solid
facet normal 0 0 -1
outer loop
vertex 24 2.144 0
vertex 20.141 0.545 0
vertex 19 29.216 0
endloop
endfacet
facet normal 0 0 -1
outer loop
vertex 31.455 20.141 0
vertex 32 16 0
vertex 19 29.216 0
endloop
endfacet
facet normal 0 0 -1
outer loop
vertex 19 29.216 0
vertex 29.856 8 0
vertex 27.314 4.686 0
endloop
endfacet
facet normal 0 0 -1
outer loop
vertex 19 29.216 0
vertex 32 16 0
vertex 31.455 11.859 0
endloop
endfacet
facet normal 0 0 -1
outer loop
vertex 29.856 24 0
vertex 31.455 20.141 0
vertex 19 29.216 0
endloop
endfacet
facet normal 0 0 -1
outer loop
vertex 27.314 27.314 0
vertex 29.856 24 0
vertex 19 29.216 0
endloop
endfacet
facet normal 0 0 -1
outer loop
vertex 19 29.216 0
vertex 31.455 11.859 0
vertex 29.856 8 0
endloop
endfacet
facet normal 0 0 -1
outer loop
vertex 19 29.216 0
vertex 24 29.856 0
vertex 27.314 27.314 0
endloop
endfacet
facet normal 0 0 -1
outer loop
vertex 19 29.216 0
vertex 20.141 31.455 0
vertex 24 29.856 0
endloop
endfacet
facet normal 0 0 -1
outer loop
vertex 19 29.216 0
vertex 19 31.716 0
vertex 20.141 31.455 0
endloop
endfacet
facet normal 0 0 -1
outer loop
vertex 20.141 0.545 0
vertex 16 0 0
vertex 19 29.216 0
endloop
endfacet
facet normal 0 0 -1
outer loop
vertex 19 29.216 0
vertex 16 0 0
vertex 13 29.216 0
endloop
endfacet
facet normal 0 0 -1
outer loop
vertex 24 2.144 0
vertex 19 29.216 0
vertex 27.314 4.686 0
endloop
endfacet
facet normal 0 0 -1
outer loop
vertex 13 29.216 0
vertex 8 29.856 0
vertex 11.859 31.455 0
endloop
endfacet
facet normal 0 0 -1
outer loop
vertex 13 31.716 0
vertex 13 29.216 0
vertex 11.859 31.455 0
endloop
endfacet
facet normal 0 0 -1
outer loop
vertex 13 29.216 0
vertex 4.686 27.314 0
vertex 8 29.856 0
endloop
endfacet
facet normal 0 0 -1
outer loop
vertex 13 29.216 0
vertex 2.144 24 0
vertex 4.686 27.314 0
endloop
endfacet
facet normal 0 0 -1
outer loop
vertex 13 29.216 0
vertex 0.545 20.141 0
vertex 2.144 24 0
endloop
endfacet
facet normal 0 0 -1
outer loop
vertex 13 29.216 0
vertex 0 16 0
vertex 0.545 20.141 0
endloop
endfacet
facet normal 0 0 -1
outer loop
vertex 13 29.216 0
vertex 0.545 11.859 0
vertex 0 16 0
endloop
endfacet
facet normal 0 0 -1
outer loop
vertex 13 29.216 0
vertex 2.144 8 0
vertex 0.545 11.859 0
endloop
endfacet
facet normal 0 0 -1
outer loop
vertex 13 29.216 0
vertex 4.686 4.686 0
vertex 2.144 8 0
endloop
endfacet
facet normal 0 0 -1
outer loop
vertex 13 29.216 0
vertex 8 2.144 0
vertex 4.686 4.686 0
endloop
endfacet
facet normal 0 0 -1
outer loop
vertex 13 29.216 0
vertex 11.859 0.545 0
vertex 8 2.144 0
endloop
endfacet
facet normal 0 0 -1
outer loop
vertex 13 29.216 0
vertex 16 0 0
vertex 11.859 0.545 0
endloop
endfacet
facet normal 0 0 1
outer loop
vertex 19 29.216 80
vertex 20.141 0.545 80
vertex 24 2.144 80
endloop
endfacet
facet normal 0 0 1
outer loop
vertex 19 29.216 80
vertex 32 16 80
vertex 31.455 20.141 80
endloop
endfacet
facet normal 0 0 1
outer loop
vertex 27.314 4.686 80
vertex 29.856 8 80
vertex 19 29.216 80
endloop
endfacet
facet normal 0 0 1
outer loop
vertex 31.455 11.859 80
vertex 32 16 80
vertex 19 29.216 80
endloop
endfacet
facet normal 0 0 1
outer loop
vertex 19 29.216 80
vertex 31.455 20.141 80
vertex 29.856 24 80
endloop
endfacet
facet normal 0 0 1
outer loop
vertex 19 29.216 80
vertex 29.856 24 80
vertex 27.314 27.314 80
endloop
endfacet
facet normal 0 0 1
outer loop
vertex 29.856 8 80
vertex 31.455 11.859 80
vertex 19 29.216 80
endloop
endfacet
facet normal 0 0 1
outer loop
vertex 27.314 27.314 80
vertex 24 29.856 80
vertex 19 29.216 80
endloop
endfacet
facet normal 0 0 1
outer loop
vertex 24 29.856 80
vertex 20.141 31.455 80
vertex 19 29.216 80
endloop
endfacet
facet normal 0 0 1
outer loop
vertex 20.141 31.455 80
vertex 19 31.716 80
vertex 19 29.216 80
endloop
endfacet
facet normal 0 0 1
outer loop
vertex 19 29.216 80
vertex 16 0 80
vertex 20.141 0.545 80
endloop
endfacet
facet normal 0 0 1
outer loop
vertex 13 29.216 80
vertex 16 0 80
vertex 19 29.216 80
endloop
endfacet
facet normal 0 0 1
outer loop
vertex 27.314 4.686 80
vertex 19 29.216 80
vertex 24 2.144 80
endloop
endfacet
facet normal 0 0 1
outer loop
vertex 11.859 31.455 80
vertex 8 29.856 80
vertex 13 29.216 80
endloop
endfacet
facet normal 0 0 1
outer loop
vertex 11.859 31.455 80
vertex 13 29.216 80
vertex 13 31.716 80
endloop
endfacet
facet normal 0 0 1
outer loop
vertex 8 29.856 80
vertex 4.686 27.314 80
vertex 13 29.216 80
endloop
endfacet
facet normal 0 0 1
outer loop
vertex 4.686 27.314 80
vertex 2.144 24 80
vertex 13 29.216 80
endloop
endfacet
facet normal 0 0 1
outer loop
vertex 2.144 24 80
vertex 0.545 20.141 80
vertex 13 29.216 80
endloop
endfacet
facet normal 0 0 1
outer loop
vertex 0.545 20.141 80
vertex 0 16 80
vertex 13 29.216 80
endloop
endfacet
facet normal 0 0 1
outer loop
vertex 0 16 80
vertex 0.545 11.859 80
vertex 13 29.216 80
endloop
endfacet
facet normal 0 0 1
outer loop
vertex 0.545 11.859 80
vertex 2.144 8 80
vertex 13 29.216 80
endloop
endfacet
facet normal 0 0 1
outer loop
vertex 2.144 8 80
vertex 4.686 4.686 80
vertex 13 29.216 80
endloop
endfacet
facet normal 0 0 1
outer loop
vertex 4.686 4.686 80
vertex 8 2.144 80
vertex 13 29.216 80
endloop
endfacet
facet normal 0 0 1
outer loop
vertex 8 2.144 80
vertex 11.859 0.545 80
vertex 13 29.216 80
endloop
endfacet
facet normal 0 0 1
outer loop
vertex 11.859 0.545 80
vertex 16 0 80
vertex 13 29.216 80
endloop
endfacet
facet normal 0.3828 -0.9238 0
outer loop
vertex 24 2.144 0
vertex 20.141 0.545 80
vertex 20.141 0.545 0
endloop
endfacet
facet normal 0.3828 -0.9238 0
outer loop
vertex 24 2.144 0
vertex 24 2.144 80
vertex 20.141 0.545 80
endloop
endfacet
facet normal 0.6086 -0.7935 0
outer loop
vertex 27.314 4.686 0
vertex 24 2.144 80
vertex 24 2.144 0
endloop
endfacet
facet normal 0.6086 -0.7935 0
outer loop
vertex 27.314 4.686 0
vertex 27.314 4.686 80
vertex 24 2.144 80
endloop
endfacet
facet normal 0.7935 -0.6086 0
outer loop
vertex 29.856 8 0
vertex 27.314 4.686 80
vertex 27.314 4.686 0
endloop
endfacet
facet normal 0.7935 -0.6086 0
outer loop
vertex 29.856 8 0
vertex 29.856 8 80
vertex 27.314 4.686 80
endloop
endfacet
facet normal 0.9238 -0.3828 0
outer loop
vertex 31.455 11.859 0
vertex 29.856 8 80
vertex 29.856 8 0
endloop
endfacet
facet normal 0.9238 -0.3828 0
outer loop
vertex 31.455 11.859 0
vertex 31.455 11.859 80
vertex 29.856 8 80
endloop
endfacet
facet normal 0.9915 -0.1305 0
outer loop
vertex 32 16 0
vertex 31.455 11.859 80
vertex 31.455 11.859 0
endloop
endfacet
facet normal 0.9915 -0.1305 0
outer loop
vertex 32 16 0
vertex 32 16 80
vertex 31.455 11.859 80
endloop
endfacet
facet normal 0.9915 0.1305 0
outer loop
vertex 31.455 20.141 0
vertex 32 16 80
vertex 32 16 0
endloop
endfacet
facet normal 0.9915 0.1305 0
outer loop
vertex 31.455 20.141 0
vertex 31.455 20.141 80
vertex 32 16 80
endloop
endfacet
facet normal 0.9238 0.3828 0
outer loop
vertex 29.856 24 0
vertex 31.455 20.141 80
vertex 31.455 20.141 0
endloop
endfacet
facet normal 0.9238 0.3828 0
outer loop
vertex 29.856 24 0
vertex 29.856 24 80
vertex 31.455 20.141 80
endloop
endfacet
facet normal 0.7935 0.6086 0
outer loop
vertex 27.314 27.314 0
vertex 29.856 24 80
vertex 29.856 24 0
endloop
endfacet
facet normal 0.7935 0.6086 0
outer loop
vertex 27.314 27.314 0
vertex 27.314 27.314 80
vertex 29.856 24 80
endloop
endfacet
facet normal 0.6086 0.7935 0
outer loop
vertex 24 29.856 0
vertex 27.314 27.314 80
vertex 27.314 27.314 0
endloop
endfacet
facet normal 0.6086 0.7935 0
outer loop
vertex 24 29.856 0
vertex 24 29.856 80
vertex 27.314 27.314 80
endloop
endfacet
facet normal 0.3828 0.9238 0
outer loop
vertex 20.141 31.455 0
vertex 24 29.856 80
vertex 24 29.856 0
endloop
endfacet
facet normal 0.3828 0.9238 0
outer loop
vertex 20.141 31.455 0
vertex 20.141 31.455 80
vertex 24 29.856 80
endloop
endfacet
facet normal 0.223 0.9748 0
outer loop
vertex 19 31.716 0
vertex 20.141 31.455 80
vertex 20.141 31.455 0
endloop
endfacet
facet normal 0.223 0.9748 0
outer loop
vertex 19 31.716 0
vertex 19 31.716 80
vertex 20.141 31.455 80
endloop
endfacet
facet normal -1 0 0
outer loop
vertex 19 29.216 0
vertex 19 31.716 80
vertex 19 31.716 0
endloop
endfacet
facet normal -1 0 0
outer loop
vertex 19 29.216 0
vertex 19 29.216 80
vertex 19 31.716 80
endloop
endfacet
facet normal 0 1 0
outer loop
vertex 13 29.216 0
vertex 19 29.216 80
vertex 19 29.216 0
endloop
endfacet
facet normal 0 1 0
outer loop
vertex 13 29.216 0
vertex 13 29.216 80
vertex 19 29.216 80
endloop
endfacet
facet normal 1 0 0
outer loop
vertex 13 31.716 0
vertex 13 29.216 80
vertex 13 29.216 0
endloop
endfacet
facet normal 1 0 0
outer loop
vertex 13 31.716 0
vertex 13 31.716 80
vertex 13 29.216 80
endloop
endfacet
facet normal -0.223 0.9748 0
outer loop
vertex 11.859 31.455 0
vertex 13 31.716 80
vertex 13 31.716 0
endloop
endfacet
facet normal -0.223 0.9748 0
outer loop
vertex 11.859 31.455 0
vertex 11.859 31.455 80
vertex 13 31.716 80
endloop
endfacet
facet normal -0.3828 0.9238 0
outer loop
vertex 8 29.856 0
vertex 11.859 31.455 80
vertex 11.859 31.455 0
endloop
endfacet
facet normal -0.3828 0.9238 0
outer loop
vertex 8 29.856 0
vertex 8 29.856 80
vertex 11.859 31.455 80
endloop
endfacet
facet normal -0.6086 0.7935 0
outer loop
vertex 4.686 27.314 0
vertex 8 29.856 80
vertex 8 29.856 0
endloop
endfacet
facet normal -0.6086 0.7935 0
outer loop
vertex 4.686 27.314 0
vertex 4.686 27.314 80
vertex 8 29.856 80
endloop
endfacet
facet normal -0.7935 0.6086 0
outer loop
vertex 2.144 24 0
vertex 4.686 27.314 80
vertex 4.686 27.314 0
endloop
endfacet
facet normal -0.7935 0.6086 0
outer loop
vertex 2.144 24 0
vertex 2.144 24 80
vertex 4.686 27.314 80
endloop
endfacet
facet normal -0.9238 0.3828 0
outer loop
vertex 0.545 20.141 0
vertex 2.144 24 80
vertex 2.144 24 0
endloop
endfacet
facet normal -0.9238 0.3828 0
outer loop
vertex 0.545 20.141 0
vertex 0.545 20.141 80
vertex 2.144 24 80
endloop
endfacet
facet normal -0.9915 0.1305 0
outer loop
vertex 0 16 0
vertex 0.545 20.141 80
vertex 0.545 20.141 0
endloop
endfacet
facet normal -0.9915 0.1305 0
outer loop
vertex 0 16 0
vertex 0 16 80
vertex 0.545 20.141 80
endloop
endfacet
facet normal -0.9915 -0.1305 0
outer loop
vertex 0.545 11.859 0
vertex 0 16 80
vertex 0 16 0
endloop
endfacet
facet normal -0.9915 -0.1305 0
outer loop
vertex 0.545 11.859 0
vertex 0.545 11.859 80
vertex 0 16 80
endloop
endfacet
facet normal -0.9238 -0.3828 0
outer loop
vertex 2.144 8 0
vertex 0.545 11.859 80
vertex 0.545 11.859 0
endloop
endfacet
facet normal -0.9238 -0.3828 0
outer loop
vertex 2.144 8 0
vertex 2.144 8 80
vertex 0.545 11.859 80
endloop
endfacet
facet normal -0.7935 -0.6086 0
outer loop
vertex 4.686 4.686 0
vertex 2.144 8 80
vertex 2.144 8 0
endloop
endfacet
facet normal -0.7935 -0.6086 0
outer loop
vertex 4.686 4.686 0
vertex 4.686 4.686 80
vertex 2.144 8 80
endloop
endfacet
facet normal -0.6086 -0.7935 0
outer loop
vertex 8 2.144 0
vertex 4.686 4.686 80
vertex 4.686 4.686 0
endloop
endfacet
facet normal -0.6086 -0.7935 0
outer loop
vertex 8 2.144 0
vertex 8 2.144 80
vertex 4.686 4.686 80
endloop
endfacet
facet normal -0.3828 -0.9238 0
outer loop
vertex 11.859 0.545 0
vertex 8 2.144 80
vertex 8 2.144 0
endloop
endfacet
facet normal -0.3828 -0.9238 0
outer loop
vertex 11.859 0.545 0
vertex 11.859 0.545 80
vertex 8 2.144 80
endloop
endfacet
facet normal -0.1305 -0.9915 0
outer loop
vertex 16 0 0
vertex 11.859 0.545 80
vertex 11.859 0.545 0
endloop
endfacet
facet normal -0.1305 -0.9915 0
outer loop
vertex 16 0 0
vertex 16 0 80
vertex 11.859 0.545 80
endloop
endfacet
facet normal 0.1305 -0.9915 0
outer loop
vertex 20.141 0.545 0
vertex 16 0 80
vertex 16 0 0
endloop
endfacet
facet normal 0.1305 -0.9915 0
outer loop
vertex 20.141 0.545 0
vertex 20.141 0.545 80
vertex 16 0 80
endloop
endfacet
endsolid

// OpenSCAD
$fn = 32;

// ----------------------------------------------------------------------
// Keyway shaft: d32 shaft, key 6 x 2.5 mm
// ----------------------------------------------------------------------

// --- parameters (mm) ---
shaft_r = 16;             // shaft radius
key_w = 6;                // keyway width
key_d = 2.5;              // keyway depth below the surface line
plate_t = 80;             // shaft length, Z (extrusion height)

shaft_d = 2 * shaft_r;  // shaft diameter
circle_step = 15;  // polygon sampling step, degrees

profile = [[11.859, 31.455], [8, 29.856], [4.686, 27.314], [2.144, 24], [0.545, 20.141], [0, 16], [0.545, 11.859], [2.144, 8], [4.686, 4.686], [8, 2.144], [11.859, 0.545], [16, 0], [20.141, 0.545], [24, 2.144], [27.314, 4.686], [29.856, 8], [31.455, 11.859], [32, 16], [31.455, 20.141], [29.856, 24], [27.314, 27.314], [24, 29.856], [20.141, 31.455], [19, 31.716], [19, 29.216], [13, 29.216], [13, 31.716]];  // primary outline, 27 points, counter clockwise

// --- the one profile operation ---
linear_extrude(height = plate_t) polygon(points = profile);
